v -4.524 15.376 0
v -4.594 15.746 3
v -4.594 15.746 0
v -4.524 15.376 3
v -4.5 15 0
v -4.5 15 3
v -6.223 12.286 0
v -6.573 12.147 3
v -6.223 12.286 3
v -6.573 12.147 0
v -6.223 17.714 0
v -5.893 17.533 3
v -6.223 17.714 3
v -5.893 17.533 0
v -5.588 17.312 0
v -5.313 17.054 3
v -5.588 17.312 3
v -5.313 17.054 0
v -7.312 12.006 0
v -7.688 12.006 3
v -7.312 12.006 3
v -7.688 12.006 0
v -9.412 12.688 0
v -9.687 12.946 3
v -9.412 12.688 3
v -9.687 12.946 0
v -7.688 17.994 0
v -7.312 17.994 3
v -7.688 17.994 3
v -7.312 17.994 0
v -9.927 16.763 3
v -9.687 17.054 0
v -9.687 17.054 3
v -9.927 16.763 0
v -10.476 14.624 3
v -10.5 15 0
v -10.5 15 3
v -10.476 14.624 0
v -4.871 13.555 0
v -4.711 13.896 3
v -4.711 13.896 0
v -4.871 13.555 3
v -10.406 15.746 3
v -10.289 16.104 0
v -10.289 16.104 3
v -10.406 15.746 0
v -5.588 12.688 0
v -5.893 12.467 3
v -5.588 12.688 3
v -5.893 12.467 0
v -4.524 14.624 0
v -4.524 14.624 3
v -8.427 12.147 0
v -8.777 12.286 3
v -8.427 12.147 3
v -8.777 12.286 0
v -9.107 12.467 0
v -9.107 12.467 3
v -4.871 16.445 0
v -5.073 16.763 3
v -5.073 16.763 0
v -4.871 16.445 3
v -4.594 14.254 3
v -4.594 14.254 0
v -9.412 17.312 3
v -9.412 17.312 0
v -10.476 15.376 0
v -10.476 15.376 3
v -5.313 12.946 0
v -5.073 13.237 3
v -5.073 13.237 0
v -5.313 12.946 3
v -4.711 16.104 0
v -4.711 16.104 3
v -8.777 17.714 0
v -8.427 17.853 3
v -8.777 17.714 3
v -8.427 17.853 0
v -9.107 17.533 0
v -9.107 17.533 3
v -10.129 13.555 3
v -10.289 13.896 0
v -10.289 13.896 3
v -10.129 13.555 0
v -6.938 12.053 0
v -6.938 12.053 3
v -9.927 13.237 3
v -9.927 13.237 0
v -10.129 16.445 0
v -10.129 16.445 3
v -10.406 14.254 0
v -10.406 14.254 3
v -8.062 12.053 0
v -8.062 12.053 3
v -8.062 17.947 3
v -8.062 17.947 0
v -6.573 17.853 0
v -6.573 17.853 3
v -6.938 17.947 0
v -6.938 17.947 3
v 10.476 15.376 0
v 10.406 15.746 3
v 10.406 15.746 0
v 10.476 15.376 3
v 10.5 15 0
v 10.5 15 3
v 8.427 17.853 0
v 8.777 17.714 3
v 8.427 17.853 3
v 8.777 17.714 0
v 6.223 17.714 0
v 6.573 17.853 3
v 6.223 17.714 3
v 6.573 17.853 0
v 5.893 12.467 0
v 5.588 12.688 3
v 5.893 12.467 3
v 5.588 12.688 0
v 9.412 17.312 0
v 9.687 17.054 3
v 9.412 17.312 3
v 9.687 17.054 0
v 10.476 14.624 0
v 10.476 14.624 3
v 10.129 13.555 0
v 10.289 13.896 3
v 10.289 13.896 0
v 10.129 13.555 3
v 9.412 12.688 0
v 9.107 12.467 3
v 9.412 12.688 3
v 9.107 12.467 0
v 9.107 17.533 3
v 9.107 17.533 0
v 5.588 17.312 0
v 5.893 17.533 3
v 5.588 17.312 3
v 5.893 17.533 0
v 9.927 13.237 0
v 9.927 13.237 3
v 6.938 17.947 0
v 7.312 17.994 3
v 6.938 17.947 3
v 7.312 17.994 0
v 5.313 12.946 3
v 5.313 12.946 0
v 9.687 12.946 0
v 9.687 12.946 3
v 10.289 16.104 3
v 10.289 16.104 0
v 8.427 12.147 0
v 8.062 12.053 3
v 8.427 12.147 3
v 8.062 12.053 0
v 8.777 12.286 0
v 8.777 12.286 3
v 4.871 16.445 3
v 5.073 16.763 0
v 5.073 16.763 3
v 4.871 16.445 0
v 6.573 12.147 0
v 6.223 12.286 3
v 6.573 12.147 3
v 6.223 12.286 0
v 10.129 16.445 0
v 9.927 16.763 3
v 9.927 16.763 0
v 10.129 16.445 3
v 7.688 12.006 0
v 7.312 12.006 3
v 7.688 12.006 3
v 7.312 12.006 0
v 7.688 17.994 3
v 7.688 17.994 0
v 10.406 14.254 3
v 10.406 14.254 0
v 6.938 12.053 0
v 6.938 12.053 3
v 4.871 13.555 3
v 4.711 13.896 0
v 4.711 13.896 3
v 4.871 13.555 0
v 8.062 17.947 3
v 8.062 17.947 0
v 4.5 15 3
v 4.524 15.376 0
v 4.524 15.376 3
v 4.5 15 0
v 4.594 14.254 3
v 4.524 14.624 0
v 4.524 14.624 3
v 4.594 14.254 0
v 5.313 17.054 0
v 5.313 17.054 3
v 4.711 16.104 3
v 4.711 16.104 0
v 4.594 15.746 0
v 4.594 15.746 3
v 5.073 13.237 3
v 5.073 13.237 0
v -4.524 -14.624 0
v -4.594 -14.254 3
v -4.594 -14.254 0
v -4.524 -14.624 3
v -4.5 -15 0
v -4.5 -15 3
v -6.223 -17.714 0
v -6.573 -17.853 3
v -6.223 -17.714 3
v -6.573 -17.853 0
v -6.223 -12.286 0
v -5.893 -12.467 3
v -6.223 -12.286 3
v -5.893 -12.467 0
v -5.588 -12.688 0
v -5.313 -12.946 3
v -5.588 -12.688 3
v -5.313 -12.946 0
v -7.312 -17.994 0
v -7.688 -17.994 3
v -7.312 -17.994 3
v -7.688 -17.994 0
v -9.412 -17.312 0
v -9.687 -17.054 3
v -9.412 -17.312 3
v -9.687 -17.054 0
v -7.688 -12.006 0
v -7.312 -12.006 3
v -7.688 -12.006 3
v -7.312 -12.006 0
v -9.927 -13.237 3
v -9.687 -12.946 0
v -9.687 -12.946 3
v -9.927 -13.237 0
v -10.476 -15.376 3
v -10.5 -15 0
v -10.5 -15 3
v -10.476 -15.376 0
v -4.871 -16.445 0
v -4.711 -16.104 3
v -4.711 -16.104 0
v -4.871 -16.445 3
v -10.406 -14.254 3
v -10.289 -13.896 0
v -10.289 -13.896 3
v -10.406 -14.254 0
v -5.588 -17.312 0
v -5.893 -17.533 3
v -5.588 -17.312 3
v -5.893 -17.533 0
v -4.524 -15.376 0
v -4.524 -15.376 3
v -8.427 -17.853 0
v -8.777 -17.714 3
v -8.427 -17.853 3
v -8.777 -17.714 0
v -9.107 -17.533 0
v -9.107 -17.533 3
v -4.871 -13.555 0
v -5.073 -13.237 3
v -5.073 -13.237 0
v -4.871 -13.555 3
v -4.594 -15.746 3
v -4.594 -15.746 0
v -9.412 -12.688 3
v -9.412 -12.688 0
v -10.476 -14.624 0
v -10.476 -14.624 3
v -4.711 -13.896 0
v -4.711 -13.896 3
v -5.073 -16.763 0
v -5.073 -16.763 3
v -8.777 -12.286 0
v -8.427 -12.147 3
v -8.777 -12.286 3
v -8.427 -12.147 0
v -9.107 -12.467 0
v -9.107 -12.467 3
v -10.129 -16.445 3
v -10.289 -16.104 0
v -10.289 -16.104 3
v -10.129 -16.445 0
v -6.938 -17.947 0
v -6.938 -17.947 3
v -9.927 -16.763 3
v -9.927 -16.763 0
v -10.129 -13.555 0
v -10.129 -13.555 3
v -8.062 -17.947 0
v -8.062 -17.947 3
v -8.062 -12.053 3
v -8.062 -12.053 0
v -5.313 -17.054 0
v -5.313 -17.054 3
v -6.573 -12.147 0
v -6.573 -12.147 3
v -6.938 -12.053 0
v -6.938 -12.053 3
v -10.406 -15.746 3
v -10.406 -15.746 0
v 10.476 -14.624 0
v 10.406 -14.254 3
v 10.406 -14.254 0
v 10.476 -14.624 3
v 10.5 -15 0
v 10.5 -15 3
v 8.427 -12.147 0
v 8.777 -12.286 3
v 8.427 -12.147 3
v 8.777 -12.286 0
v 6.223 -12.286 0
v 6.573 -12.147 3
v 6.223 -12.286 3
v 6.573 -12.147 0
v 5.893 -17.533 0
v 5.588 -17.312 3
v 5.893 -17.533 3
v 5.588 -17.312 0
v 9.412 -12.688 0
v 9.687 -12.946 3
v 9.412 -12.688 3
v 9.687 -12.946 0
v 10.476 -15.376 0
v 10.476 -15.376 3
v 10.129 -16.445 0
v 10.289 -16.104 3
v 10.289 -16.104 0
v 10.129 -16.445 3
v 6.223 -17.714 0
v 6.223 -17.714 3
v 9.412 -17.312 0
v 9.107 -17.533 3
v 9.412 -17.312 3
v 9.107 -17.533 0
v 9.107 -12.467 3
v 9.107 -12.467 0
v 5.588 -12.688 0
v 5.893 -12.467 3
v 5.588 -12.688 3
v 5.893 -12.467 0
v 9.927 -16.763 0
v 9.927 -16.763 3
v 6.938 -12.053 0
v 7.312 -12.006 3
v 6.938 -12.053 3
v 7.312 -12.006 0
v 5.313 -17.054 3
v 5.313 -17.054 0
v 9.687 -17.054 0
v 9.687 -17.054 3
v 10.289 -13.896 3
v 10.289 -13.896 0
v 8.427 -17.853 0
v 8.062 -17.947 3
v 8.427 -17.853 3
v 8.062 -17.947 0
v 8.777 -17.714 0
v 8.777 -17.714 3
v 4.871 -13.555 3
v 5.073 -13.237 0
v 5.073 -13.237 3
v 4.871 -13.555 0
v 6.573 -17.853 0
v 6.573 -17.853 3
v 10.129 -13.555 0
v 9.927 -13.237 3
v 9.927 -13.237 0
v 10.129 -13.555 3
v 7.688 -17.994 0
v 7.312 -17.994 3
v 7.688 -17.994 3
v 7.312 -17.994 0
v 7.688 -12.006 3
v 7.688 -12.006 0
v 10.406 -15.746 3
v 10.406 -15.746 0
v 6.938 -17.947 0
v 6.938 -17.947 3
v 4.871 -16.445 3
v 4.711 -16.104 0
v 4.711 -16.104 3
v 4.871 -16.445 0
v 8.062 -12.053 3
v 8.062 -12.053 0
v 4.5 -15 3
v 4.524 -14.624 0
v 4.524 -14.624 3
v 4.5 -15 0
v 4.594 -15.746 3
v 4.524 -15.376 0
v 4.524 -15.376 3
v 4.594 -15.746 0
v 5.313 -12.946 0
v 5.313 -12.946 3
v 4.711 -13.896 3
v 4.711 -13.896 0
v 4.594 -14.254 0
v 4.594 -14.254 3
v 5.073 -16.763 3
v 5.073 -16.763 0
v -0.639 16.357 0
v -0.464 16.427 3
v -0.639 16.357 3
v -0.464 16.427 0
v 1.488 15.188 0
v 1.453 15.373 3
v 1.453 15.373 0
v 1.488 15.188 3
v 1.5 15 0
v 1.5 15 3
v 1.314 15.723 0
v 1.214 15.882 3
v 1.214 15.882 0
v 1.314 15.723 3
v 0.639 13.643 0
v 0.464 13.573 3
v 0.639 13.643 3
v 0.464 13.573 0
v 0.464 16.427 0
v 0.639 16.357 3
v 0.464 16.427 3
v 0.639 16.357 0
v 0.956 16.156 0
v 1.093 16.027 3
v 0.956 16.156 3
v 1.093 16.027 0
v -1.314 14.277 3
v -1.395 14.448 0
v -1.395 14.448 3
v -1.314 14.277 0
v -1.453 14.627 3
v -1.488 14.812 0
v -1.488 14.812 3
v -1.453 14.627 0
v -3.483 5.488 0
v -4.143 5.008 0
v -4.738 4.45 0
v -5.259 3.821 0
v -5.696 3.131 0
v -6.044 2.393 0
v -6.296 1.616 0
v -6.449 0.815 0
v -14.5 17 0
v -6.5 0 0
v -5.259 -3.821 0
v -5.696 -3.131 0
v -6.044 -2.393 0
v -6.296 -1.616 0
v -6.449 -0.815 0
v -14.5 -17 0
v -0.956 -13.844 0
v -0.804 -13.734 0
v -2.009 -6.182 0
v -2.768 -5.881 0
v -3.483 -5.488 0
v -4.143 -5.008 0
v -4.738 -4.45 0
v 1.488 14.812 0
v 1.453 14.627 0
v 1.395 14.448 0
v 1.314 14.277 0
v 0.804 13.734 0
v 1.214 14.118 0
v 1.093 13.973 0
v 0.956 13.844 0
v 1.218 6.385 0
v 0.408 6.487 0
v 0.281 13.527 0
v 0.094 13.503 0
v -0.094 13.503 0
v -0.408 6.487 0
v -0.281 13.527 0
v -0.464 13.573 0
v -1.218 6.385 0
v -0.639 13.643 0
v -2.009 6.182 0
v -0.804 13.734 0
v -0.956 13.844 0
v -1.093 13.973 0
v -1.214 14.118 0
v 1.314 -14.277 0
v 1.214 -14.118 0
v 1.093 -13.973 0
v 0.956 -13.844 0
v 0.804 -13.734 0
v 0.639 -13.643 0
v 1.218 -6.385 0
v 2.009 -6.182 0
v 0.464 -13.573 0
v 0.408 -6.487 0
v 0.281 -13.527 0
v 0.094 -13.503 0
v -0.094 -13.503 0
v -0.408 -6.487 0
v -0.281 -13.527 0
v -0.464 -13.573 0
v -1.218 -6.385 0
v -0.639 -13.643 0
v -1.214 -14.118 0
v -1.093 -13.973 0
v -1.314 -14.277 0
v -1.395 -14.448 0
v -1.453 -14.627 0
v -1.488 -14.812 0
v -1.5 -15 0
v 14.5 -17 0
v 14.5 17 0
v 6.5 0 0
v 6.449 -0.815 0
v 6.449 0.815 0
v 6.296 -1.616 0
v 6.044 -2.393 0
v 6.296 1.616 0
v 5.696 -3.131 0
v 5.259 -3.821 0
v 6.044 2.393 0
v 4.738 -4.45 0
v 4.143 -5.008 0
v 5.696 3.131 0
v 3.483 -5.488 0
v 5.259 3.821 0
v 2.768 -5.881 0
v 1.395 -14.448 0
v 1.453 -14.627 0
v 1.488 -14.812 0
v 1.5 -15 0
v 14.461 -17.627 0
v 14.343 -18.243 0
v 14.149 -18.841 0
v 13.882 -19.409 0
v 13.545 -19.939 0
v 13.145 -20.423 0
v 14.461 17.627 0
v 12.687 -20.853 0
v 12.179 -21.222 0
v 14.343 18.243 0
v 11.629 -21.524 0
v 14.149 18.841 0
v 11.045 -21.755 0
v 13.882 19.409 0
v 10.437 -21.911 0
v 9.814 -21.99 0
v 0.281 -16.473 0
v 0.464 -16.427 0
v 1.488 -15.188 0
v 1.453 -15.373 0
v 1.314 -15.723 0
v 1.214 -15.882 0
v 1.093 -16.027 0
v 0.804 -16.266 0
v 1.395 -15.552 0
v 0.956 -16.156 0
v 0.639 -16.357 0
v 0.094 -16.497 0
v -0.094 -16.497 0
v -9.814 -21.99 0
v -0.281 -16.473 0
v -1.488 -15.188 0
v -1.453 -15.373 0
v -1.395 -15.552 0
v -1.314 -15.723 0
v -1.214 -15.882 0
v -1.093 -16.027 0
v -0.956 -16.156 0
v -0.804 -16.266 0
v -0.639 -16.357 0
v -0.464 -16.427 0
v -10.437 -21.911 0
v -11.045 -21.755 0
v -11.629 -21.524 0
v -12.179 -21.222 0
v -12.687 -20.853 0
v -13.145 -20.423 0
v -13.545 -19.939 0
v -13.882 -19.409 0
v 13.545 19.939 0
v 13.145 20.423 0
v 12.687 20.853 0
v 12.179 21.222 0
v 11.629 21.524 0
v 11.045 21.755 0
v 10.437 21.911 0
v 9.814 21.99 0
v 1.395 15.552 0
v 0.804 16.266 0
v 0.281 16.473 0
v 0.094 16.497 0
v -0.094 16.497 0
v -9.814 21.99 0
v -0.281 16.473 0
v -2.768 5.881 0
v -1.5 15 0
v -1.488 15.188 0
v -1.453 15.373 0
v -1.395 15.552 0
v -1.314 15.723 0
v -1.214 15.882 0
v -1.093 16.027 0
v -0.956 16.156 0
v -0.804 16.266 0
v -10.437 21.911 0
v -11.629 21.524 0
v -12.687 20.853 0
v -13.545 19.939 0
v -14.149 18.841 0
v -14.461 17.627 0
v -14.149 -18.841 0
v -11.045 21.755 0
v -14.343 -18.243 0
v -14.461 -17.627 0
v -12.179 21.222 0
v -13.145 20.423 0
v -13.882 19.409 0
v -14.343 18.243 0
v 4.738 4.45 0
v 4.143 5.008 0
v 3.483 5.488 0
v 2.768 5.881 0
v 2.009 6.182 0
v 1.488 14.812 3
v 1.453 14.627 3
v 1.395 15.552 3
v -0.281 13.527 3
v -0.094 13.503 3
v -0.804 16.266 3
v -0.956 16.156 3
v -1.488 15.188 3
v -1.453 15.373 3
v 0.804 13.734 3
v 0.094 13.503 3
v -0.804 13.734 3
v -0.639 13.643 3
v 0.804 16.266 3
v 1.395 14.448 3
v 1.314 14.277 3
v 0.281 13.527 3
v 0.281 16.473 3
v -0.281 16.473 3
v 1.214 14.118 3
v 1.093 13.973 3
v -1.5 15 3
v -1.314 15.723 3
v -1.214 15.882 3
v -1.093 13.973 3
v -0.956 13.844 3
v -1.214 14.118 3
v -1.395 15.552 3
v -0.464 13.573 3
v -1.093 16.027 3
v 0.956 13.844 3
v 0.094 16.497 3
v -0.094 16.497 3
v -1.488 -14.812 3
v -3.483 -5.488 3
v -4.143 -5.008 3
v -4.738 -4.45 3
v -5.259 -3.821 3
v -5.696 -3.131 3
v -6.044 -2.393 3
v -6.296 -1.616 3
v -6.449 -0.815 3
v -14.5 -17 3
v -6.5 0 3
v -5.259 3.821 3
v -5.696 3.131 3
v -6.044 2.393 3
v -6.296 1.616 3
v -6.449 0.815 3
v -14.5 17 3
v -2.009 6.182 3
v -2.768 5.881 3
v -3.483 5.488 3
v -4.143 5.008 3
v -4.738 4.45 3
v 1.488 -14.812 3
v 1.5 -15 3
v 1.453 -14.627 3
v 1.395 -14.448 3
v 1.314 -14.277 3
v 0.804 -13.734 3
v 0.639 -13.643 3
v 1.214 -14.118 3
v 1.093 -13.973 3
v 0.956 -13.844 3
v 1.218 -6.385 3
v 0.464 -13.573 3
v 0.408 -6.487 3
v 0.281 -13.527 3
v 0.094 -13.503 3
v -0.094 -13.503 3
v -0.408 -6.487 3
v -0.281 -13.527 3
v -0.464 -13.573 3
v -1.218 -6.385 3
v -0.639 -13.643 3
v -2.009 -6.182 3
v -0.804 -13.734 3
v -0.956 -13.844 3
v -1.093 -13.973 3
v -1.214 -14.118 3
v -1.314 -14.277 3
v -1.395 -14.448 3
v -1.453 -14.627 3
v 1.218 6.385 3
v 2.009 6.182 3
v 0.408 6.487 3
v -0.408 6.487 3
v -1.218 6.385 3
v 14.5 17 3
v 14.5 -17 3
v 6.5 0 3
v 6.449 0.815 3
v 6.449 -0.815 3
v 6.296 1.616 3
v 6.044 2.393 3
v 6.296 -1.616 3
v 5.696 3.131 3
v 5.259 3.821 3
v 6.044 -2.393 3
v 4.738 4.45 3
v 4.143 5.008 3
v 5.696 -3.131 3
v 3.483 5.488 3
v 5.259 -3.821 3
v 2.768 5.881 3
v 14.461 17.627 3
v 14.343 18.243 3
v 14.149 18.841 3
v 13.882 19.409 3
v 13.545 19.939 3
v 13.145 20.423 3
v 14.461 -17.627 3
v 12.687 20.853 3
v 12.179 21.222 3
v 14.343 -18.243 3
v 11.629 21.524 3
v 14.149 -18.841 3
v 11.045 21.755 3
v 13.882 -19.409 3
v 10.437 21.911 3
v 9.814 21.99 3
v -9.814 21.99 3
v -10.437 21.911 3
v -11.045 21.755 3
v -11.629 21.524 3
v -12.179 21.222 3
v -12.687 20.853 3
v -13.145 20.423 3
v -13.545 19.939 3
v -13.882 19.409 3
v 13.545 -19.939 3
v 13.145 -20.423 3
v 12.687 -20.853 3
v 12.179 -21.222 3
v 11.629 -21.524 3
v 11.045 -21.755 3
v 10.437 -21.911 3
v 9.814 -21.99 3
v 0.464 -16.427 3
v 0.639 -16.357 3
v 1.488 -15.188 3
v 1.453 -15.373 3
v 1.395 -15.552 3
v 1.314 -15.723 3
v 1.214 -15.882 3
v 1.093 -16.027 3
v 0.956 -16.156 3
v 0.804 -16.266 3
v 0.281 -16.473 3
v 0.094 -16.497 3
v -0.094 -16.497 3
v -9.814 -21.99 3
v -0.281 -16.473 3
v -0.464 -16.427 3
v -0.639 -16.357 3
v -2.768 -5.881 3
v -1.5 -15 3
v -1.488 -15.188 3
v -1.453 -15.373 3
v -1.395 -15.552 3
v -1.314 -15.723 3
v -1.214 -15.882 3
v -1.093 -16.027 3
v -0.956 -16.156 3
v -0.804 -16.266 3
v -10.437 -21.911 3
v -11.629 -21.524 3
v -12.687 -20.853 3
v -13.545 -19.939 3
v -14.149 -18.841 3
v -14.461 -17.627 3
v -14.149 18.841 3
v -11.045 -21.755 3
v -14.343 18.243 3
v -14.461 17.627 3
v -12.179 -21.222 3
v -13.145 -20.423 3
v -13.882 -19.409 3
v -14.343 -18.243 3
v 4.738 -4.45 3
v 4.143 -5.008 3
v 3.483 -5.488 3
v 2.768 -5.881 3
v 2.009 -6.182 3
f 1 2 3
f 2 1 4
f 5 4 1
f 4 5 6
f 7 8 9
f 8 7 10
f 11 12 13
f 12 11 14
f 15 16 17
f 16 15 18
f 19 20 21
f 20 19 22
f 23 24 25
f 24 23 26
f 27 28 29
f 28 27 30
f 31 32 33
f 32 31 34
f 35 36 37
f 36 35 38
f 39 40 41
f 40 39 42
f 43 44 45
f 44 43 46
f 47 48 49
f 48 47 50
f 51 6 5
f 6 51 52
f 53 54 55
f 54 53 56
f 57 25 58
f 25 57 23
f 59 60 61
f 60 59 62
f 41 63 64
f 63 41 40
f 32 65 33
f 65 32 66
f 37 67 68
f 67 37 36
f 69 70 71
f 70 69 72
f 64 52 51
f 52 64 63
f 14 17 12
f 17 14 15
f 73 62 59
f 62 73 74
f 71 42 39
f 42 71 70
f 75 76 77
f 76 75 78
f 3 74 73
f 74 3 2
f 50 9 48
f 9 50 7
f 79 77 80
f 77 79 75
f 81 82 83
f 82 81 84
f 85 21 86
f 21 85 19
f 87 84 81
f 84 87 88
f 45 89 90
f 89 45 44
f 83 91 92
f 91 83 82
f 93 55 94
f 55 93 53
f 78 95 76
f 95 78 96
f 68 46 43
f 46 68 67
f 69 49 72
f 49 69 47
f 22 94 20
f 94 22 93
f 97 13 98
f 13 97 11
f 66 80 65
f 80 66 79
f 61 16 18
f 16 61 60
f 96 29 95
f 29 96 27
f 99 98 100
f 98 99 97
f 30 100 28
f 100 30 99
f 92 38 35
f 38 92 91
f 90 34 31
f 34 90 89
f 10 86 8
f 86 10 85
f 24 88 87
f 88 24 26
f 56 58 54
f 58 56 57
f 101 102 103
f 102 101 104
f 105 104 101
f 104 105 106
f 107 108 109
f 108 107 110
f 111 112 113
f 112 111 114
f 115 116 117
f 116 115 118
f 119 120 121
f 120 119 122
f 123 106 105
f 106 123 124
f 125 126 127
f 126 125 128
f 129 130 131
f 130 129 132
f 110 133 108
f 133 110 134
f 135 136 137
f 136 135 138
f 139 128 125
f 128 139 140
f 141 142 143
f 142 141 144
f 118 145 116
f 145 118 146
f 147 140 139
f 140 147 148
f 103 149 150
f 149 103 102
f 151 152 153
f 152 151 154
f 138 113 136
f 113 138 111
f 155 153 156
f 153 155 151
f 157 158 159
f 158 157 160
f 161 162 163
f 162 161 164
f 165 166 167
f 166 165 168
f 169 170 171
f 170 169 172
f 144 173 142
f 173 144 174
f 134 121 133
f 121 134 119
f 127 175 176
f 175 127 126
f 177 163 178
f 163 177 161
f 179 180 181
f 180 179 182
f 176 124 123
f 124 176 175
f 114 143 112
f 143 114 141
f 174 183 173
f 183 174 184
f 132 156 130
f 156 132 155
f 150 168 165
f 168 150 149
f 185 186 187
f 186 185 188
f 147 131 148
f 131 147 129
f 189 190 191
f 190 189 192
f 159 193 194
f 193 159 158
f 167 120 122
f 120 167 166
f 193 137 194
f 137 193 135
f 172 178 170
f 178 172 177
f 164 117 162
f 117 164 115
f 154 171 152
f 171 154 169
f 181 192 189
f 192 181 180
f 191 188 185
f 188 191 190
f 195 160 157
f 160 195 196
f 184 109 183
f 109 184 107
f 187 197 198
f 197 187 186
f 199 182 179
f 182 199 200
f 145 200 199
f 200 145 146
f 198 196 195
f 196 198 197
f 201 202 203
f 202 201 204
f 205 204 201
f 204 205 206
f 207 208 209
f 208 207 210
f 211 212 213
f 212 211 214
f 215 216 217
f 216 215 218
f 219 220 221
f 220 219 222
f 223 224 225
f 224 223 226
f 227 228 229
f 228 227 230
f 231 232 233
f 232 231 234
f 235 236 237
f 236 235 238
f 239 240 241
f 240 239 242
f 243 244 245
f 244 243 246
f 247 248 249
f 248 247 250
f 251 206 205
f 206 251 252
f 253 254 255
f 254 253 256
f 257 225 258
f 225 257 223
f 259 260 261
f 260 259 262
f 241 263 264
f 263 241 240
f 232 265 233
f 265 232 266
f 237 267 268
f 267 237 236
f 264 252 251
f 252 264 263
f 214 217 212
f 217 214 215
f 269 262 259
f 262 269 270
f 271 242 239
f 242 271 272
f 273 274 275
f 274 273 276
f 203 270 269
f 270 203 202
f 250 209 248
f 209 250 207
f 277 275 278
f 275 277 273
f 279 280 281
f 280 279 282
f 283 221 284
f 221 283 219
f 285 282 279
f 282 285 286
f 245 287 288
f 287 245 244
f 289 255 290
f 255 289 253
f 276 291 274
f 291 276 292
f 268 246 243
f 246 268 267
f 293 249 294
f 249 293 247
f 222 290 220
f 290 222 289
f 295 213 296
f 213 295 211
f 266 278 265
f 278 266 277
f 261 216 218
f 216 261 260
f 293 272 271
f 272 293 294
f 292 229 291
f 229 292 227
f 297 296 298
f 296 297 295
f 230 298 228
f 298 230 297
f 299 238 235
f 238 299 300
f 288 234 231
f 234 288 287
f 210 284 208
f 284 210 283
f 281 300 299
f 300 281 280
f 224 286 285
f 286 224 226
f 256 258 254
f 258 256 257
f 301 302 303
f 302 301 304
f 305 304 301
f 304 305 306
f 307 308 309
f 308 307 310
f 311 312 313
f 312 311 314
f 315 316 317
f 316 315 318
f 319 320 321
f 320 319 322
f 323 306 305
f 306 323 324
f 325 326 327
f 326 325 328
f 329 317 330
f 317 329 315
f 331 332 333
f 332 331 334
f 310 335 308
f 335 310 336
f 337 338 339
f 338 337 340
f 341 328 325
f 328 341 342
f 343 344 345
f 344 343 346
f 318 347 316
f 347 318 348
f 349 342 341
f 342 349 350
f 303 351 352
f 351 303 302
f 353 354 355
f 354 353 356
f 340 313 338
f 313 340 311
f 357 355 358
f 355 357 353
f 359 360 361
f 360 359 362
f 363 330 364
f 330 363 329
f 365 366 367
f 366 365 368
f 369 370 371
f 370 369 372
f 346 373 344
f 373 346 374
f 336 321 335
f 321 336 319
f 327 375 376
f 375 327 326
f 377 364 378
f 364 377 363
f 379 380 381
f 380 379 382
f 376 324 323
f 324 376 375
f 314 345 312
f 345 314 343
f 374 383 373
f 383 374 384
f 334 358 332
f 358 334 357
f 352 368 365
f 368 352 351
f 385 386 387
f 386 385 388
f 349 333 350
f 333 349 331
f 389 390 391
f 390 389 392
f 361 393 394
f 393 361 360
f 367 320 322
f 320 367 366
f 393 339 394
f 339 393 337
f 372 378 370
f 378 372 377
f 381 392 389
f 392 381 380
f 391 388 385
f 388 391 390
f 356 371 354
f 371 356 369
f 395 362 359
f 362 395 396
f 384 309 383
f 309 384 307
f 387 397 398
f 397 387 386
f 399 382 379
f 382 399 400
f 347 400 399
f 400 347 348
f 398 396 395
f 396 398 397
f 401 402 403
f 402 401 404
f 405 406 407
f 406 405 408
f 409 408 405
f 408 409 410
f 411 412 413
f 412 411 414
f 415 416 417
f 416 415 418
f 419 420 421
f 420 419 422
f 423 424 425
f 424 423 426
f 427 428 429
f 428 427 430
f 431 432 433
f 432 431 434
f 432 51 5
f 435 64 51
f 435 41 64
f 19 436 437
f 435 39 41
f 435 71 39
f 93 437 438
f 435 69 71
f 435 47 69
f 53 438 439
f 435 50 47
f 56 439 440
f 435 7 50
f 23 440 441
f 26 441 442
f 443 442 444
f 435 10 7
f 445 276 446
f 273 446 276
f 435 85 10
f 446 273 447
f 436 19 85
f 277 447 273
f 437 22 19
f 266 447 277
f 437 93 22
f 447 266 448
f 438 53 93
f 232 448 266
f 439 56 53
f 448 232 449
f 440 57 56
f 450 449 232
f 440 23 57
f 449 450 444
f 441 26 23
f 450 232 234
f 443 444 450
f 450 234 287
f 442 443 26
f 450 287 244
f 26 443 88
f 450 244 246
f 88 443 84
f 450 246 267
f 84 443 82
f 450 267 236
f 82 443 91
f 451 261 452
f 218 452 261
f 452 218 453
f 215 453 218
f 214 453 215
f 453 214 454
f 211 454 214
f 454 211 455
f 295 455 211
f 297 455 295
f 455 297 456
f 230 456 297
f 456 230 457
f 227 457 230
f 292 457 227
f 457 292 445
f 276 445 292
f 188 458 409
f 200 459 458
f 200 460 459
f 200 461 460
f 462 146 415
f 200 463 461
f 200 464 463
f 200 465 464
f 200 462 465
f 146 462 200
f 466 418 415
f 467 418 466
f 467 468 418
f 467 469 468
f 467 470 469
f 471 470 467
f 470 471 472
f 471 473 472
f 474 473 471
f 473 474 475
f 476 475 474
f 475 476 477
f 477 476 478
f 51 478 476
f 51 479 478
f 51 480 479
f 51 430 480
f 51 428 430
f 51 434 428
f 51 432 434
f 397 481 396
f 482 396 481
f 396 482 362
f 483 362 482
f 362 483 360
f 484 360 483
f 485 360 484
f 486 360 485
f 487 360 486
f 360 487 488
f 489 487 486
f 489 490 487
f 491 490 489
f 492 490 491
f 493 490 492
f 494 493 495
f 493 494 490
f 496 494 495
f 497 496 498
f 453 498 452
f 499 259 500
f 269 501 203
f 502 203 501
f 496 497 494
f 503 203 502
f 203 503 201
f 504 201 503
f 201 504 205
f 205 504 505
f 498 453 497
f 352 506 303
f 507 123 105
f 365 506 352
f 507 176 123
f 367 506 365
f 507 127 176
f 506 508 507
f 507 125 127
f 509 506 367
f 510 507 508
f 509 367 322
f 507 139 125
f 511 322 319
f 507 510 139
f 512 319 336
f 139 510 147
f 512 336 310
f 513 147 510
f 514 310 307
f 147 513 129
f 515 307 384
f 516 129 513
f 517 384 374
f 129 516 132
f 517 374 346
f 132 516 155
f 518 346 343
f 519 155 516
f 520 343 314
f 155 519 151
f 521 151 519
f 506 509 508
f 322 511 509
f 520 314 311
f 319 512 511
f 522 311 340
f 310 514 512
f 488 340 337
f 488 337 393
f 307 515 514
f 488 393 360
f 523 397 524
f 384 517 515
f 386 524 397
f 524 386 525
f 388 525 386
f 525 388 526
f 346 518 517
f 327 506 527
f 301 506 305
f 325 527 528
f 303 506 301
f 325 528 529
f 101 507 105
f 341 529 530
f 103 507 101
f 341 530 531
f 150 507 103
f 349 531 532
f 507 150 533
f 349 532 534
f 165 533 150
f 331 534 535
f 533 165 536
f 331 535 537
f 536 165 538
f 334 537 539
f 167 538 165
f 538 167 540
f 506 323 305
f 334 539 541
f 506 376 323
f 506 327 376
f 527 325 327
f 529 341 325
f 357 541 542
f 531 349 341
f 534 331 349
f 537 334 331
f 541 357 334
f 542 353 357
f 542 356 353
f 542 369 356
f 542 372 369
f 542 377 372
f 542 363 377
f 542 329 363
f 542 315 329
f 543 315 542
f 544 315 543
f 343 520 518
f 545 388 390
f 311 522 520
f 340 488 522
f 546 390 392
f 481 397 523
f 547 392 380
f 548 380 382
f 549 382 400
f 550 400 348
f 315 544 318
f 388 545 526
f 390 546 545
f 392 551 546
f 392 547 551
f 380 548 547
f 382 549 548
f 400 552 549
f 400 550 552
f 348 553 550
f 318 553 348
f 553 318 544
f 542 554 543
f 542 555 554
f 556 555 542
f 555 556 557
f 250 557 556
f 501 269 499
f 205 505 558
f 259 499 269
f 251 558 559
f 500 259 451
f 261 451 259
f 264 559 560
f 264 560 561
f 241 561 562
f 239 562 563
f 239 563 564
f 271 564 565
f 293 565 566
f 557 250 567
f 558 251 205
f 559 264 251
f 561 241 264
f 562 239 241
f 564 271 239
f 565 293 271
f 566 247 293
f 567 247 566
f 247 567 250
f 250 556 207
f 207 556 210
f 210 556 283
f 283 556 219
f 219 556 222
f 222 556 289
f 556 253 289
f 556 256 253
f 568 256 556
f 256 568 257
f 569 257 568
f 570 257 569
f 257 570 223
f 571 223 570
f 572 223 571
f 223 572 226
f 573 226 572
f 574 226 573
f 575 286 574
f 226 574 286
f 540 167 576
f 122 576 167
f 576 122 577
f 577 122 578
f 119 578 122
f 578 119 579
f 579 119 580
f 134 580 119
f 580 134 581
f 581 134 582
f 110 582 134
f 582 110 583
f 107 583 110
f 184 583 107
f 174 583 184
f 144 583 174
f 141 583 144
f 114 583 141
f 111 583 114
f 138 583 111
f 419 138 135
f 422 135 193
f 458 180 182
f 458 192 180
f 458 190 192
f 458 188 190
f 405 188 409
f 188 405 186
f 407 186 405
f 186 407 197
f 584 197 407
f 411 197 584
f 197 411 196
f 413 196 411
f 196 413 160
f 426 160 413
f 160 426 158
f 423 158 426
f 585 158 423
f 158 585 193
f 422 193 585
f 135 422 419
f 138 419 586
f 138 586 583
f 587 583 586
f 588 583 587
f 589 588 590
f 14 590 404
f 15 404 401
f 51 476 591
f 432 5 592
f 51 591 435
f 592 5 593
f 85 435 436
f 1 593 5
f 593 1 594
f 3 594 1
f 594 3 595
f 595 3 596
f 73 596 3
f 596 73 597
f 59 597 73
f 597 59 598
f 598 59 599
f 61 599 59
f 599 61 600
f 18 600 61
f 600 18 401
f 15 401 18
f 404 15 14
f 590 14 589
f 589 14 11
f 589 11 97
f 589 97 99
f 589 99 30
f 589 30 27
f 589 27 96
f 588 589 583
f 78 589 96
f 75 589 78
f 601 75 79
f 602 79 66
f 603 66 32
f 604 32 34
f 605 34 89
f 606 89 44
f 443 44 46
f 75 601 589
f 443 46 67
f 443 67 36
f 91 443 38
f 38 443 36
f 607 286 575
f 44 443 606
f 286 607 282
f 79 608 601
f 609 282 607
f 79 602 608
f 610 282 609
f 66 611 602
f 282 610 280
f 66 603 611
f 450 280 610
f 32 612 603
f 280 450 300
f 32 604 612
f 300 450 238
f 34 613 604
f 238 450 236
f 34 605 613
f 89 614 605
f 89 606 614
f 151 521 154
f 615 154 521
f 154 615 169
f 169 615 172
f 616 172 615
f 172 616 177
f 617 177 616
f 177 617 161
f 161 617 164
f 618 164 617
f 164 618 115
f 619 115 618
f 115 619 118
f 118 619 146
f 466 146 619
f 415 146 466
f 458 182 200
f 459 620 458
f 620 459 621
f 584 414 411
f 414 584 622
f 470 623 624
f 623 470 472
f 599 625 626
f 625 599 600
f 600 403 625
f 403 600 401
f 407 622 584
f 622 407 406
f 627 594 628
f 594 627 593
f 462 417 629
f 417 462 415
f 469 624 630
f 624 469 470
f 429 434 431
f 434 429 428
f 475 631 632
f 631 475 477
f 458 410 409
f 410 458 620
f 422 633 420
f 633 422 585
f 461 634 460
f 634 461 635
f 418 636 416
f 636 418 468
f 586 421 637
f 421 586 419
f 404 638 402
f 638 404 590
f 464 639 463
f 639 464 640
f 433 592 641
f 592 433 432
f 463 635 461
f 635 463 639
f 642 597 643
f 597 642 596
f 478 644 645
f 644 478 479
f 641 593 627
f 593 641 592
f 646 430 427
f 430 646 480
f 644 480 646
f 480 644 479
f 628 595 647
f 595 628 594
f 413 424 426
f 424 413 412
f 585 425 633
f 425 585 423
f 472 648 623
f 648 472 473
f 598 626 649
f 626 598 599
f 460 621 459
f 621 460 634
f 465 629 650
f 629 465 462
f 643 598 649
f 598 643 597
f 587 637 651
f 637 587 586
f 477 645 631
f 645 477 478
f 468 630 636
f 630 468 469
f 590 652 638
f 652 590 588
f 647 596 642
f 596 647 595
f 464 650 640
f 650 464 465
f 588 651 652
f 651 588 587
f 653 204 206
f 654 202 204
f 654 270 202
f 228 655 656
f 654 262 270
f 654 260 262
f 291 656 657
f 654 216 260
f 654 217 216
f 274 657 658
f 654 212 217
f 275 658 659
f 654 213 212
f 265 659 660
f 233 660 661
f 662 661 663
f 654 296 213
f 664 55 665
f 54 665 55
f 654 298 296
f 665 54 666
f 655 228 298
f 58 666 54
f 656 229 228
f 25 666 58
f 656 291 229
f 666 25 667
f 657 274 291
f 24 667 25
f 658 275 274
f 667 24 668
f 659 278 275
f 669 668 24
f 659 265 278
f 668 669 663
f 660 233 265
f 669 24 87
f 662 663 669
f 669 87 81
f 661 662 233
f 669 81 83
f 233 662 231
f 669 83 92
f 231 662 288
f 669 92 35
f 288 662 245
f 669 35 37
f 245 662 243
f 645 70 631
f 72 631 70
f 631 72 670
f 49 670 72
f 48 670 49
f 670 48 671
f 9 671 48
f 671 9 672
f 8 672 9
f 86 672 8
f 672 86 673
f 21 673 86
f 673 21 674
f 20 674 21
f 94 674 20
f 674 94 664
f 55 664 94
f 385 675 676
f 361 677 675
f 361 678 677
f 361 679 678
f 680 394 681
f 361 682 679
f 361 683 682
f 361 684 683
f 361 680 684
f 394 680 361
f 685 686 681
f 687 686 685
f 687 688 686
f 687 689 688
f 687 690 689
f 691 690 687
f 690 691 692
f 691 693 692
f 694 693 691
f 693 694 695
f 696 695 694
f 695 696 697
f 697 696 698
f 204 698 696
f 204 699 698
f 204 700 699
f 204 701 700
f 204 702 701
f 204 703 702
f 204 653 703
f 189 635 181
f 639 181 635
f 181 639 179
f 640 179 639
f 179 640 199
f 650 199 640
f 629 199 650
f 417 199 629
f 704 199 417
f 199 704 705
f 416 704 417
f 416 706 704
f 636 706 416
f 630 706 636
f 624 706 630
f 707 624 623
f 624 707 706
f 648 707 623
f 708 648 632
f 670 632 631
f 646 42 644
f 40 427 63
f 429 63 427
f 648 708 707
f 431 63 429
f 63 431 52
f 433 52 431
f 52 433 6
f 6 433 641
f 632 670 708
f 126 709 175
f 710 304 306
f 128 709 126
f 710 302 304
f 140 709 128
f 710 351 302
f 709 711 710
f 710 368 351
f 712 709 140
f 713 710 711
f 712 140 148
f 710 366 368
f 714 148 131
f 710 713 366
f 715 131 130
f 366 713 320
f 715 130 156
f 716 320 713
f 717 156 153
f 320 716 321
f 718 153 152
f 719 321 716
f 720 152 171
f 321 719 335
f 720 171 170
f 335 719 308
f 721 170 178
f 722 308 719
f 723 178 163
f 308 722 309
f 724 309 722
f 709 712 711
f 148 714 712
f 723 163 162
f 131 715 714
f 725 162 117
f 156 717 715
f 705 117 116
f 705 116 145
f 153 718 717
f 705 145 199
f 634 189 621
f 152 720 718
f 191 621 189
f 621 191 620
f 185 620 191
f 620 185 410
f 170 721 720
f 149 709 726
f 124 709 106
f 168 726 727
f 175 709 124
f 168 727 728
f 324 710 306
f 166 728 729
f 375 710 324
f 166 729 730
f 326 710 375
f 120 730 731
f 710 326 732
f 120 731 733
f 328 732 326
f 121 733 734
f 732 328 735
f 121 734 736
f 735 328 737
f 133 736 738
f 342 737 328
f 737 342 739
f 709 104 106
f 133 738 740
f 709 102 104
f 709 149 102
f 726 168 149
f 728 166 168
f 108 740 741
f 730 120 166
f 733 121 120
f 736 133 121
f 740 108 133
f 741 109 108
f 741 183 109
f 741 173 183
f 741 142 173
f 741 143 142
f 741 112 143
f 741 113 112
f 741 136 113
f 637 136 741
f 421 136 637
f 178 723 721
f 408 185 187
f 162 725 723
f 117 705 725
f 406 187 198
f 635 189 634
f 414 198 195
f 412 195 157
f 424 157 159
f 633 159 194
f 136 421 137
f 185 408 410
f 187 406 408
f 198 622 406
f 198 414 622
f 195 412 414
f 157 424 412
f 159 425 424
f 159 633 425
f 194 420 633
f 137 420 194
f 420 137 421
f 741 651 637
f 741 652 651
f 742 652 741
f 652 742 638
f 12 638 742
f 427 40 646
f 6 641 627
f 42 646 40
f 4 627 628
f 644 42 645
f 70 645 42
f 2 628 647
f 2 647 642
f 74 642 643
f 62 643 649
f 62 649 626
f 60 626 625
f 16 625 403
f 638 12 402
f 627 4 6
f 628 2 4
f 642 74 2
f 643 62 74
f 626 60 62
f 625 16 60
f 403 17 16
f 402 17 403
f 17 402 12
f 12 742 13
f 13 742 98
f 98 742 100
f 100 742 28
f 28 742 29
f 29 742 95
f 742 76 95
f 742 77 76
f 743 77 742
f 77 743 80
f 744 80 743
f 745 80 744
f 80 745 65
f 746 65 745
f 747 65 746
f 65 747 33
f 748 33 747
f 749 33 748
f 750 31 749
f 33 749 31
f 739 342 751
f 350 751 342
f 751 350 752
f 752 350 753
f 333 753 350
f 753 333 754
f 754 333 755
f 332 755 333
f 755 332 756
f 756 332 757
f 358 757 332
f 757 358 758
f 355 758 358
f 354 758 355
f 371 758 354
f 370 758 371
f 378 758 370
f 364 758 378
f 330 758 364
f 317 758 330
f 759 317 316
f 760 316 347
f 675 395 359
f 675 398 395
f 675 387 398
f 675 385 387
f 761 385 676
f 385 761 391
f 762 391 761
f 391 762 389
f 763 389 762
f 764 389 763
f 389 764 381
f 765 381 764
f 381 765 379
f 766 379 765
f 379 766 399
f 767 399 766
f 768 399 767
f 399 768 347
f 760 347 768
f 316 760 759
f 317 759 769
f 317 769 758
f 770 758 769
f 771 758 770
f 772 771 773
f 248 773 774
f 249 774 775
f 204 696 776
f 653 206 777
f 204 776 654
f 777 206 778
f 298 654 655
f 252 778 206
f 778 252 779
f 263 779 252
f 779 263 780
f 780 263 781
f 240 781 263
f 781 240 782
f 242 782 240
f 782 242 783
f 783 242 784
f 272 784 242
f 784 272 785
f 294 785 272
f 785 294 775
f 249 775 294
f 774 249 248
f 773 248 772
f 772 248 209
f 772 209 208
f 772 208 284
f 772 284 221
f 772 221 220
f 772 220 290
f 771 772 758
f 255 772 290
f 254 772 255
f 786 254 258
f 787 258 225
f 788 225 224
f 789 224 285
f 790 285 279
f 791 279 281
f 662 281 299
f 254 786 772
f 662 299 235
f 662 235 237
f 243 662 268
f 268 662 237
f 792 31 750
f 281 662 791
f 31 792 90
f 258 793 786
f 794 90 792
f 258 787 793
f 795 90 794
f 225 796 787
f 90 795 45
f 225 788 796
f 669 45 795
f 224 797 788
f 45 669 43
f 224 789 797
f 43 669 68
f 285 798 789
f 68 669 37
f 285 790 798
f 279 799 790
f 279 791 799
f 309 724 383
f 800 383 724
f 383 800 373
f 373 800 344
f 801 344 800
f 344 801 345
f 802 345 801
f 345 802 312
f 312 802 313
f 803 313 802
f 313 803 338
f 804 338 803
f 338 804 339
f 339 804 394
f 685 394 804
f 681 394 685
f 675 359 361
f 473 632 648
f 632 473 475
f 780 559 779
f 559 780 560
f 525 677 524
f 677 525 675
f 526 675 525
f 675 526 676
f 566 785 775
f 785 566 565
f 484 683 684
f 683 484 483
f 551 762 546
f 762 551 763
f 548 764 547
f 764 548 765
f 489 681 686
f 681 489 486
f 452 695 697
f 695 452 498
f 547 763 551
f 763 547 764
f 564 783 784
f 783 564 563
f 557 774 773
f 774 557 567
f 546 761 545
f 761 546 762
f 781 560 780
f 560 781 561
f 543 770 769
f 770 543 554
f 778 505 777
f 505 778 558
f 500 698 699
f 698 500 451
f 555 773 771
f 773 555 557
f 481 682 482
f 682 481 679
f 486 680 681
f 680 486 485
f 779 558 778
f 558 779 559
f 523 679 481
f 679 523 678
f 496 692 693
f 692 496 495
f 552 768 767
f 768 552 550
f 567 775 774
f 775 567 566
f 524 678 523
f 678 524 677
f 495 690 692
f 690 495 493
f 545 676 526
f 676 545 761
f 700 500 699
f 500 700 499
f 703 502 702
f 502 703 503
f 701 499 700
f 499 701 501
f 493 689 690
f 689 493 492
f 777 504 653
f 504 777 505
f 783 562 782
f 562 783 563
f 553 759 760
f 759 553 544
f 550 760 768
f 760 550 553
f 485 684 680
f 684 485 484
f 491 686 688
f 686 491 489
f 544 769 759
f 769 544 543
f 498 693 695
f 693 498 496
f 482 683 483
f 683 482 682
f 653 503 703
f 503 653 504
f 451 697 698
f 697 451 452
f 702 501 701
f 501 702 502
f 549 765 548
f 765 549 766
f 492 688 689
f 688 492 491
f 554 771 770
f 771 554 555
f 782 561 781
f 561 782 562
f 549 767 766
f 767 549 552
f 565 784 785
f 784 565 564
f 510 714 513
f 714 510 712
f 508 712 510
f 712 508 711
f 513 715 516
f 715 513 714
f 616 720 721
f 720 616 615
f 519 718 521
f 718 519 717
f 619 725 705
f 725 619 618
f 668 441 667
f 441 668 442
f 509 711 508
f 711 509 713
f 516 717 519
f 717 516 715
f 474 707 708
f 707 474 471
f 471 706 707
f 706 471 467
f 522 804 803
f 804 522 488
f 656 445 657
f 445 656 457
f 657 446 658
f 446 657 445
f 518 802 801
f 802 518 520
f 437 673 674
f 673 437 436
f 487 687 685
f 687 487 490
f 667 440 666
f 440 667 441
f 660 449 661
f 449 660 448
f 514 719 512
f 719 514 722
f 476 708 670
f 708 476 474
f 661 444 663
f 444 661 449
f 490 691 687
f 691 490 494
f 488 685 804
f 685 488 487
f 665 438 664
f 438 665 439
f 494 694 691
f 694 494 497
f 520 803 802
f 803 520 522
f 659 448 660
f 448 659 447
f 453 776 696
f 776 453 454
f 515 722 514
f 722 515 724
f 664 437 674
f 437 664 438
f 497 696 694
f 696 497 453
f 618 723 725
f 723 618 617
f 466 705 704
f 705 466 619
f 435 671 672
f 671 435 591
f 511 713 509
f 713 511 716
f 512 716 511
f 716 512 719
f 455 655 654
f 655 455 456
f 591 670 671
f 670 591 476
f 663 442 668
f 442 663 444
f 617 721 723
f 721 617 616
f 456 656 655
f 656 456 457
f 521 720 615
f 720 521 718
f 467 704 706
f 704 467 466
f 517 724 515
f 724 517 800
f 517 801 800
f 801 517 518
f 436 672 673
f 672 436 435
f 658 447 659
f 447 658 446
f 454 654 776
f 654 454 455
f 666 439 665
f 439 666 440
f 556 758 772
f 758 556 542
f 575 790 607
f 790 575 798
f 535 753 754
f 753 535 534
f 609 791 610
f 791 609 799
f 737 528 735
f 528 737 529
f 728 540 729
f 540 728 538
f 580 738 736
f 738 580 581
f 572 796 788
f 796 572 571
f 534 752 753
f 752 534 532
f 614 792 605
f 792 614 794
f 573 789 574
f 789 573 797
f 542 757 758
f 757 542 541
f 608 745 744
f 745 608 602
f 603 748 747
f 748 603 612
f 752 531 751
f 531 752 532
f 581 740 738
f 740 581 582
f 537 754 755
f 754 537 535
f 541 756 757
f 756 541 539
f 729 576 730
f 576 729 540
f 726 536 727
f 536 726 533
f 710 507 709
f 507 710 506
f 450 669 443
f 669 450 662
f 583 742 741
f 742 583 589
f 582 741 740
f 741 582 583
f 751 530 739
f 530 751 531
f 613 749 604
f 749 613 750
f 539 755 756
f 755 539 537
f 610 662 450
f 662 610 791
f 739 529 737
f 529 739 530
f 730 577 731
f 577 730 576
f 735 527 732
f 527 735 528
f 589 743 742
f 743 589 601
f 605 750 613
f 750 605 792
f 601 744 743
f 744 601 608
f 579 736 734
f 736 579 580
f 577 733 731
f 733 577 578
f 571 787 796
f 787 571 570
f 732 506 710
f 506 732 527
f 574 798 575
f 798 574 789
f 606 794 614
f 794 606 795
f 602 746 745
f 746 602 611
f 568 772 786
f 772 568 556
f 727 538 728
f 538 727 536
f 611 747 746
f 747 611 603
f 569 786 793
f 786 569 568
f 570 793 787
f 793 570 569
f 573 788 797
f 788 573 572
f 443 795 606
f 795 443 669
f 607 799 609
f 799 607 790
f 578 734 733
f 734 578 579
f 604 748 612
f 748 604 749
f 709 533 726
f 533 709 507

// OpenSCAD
$fn = 50;


difference() {
	union() {
		hull() {
			translate(v = [-9.5000000000, 17.0000000000, 0]) {
				cylinder(h = 3, r = 5);
			}
			translate(v = [9.5000000000, 17.0000000000, 0]) {
				cylinder(h = 3, r = 5);
			}
			translate(v = [-9.5000000000, -17.0000000000, 0]) {
				cylinder(h = 3, r = 5);
			}
			translate(v = [9.5000000000, -17.0000000000, 0]) {
				cylinder(h = 3, r = 5);
			}
		}
	}
	union() {
		#translate(v = [-7.5000000000, 15.0000000000, 0]) {
			cylinder(h = 3, r = 3.0000000000);
		}
		#translate(v = [7.5000000000, 15.0000000000, 0]) {
			cylinder(h = 3, r = 3.0000000000);
		}
		#translate(v = [-7.5000000000, -15.0000000000, 0]) {
			cylinder(h = 3, r = 3.0000000000);
		}
		#translate(v = [7.5000000000, -15.0000000000, 0]) {
			cylinder(h = 3, r = 3.0000000000);
		}
		#translate(v = [-7.5000000000, -15.0000000000, -100.0000000000]) {
			cylinder(h = 200, r = 3.0000000000);
		}
		#translate(v = [-7.5000000000, 15.0000000000, -100.0000000000]) {
			cylinder(h = 200, r = 3.0000000000);
		}
		#translate(v = [7.5000000000, -15.0000000000, -100.0000000000]) {
			cylinder(h = 200, r = 3.0000000000);
		}
		#translate(v = [7.5000000000, 15.0000000000, -100.0000000000]) {
			cylinder(h = 200, r = 3.0000000000);
		}
		#translate(v = [-7.5000000000, 15.0000000000, 0]) {
			cylinder(h = 3, r = 1.5000000000);
		}
		#translate(v = [0.0000000000, 15.0000000000, 0]) {
			cylinder(h = 3, r = 1.5000000000);
		}
		#translate(v = [7.5000000000, 15.0000000000, 0]) {
			cylinder(h = 3, r = 1.5000000000);
		}
		#translate(v = [-7.5000000000, -15.0000000000, 0]) {
			cylinder(h = 3, r = 1.5000000000);
		}
		#translate(v = [0.0000000000, -15.0000000000, 0]) {
			cylinder(h = 3, r = 1.5000000000);
		}
		#translate(v = [7.5000000000, -15.0000000000, 0]) {
			cylinder(h = 3, r = 1.5000000000);
		}
		#translate(v = [-7.5000000000, 15.0000000000, 0]) {
			cylinder(h = 3, r = 1.5000000000);
		}
		#translate(v = [0.0000000000, 15.0000000000, 0]) {
			cylinder(h = 3, r = 1.5000000000);
		}
		#translate(v = [7.5000000000, 15.0000000000, 0]) {
			cylinder(h = 3, r = 1.5000000000);
		}
		#translate(v = [-7.5000000000, -15.0000000000, 0]) {
			cylinder(h = 3, r = 1.5000000000);
		}
		#translate(v = [0.0000000000, -15.0000000000, 0]) {
			cylinder(h = 3, r = 1.5000000000);
		}
		#translate(v = [7.5000000000, -15.0000000000, 0]) {
			cylinder(h = 3, r = 1.5000000000);
		}
		#translate(v = [-7.5000000000, 15.0000000000, 0]) {
			cylinder(h = 3, r = 1.5000000000);
		}
		#translate(v = [0.0000000000, 15.0000000000, 0]) {
			cylinder(h = 3, r = 1.5000000000);
		}
		#translate(v = [7.5000000000, 15.0000000000, 0]) {
			cylinder(h = 3, r = 1.5000000000);
		}
		#translate(v = [-7.5000000000, -15.0000000000, 0]) {
			cylinder(h = 3, r = 1.5000000000);
		}
		#translate(v = [0.0000000000, -15.0000000000, 0]) {
			cylinder(h = 3, r = 1.5000000000);
		}
		#translate(v = [7.5000000000, -15.0000000000, 0]) {
			cylinder(h = 3, r = 1.5000000000);
		}
		#cylinder(h = 3, r = 6.5000000000);
	}
}
